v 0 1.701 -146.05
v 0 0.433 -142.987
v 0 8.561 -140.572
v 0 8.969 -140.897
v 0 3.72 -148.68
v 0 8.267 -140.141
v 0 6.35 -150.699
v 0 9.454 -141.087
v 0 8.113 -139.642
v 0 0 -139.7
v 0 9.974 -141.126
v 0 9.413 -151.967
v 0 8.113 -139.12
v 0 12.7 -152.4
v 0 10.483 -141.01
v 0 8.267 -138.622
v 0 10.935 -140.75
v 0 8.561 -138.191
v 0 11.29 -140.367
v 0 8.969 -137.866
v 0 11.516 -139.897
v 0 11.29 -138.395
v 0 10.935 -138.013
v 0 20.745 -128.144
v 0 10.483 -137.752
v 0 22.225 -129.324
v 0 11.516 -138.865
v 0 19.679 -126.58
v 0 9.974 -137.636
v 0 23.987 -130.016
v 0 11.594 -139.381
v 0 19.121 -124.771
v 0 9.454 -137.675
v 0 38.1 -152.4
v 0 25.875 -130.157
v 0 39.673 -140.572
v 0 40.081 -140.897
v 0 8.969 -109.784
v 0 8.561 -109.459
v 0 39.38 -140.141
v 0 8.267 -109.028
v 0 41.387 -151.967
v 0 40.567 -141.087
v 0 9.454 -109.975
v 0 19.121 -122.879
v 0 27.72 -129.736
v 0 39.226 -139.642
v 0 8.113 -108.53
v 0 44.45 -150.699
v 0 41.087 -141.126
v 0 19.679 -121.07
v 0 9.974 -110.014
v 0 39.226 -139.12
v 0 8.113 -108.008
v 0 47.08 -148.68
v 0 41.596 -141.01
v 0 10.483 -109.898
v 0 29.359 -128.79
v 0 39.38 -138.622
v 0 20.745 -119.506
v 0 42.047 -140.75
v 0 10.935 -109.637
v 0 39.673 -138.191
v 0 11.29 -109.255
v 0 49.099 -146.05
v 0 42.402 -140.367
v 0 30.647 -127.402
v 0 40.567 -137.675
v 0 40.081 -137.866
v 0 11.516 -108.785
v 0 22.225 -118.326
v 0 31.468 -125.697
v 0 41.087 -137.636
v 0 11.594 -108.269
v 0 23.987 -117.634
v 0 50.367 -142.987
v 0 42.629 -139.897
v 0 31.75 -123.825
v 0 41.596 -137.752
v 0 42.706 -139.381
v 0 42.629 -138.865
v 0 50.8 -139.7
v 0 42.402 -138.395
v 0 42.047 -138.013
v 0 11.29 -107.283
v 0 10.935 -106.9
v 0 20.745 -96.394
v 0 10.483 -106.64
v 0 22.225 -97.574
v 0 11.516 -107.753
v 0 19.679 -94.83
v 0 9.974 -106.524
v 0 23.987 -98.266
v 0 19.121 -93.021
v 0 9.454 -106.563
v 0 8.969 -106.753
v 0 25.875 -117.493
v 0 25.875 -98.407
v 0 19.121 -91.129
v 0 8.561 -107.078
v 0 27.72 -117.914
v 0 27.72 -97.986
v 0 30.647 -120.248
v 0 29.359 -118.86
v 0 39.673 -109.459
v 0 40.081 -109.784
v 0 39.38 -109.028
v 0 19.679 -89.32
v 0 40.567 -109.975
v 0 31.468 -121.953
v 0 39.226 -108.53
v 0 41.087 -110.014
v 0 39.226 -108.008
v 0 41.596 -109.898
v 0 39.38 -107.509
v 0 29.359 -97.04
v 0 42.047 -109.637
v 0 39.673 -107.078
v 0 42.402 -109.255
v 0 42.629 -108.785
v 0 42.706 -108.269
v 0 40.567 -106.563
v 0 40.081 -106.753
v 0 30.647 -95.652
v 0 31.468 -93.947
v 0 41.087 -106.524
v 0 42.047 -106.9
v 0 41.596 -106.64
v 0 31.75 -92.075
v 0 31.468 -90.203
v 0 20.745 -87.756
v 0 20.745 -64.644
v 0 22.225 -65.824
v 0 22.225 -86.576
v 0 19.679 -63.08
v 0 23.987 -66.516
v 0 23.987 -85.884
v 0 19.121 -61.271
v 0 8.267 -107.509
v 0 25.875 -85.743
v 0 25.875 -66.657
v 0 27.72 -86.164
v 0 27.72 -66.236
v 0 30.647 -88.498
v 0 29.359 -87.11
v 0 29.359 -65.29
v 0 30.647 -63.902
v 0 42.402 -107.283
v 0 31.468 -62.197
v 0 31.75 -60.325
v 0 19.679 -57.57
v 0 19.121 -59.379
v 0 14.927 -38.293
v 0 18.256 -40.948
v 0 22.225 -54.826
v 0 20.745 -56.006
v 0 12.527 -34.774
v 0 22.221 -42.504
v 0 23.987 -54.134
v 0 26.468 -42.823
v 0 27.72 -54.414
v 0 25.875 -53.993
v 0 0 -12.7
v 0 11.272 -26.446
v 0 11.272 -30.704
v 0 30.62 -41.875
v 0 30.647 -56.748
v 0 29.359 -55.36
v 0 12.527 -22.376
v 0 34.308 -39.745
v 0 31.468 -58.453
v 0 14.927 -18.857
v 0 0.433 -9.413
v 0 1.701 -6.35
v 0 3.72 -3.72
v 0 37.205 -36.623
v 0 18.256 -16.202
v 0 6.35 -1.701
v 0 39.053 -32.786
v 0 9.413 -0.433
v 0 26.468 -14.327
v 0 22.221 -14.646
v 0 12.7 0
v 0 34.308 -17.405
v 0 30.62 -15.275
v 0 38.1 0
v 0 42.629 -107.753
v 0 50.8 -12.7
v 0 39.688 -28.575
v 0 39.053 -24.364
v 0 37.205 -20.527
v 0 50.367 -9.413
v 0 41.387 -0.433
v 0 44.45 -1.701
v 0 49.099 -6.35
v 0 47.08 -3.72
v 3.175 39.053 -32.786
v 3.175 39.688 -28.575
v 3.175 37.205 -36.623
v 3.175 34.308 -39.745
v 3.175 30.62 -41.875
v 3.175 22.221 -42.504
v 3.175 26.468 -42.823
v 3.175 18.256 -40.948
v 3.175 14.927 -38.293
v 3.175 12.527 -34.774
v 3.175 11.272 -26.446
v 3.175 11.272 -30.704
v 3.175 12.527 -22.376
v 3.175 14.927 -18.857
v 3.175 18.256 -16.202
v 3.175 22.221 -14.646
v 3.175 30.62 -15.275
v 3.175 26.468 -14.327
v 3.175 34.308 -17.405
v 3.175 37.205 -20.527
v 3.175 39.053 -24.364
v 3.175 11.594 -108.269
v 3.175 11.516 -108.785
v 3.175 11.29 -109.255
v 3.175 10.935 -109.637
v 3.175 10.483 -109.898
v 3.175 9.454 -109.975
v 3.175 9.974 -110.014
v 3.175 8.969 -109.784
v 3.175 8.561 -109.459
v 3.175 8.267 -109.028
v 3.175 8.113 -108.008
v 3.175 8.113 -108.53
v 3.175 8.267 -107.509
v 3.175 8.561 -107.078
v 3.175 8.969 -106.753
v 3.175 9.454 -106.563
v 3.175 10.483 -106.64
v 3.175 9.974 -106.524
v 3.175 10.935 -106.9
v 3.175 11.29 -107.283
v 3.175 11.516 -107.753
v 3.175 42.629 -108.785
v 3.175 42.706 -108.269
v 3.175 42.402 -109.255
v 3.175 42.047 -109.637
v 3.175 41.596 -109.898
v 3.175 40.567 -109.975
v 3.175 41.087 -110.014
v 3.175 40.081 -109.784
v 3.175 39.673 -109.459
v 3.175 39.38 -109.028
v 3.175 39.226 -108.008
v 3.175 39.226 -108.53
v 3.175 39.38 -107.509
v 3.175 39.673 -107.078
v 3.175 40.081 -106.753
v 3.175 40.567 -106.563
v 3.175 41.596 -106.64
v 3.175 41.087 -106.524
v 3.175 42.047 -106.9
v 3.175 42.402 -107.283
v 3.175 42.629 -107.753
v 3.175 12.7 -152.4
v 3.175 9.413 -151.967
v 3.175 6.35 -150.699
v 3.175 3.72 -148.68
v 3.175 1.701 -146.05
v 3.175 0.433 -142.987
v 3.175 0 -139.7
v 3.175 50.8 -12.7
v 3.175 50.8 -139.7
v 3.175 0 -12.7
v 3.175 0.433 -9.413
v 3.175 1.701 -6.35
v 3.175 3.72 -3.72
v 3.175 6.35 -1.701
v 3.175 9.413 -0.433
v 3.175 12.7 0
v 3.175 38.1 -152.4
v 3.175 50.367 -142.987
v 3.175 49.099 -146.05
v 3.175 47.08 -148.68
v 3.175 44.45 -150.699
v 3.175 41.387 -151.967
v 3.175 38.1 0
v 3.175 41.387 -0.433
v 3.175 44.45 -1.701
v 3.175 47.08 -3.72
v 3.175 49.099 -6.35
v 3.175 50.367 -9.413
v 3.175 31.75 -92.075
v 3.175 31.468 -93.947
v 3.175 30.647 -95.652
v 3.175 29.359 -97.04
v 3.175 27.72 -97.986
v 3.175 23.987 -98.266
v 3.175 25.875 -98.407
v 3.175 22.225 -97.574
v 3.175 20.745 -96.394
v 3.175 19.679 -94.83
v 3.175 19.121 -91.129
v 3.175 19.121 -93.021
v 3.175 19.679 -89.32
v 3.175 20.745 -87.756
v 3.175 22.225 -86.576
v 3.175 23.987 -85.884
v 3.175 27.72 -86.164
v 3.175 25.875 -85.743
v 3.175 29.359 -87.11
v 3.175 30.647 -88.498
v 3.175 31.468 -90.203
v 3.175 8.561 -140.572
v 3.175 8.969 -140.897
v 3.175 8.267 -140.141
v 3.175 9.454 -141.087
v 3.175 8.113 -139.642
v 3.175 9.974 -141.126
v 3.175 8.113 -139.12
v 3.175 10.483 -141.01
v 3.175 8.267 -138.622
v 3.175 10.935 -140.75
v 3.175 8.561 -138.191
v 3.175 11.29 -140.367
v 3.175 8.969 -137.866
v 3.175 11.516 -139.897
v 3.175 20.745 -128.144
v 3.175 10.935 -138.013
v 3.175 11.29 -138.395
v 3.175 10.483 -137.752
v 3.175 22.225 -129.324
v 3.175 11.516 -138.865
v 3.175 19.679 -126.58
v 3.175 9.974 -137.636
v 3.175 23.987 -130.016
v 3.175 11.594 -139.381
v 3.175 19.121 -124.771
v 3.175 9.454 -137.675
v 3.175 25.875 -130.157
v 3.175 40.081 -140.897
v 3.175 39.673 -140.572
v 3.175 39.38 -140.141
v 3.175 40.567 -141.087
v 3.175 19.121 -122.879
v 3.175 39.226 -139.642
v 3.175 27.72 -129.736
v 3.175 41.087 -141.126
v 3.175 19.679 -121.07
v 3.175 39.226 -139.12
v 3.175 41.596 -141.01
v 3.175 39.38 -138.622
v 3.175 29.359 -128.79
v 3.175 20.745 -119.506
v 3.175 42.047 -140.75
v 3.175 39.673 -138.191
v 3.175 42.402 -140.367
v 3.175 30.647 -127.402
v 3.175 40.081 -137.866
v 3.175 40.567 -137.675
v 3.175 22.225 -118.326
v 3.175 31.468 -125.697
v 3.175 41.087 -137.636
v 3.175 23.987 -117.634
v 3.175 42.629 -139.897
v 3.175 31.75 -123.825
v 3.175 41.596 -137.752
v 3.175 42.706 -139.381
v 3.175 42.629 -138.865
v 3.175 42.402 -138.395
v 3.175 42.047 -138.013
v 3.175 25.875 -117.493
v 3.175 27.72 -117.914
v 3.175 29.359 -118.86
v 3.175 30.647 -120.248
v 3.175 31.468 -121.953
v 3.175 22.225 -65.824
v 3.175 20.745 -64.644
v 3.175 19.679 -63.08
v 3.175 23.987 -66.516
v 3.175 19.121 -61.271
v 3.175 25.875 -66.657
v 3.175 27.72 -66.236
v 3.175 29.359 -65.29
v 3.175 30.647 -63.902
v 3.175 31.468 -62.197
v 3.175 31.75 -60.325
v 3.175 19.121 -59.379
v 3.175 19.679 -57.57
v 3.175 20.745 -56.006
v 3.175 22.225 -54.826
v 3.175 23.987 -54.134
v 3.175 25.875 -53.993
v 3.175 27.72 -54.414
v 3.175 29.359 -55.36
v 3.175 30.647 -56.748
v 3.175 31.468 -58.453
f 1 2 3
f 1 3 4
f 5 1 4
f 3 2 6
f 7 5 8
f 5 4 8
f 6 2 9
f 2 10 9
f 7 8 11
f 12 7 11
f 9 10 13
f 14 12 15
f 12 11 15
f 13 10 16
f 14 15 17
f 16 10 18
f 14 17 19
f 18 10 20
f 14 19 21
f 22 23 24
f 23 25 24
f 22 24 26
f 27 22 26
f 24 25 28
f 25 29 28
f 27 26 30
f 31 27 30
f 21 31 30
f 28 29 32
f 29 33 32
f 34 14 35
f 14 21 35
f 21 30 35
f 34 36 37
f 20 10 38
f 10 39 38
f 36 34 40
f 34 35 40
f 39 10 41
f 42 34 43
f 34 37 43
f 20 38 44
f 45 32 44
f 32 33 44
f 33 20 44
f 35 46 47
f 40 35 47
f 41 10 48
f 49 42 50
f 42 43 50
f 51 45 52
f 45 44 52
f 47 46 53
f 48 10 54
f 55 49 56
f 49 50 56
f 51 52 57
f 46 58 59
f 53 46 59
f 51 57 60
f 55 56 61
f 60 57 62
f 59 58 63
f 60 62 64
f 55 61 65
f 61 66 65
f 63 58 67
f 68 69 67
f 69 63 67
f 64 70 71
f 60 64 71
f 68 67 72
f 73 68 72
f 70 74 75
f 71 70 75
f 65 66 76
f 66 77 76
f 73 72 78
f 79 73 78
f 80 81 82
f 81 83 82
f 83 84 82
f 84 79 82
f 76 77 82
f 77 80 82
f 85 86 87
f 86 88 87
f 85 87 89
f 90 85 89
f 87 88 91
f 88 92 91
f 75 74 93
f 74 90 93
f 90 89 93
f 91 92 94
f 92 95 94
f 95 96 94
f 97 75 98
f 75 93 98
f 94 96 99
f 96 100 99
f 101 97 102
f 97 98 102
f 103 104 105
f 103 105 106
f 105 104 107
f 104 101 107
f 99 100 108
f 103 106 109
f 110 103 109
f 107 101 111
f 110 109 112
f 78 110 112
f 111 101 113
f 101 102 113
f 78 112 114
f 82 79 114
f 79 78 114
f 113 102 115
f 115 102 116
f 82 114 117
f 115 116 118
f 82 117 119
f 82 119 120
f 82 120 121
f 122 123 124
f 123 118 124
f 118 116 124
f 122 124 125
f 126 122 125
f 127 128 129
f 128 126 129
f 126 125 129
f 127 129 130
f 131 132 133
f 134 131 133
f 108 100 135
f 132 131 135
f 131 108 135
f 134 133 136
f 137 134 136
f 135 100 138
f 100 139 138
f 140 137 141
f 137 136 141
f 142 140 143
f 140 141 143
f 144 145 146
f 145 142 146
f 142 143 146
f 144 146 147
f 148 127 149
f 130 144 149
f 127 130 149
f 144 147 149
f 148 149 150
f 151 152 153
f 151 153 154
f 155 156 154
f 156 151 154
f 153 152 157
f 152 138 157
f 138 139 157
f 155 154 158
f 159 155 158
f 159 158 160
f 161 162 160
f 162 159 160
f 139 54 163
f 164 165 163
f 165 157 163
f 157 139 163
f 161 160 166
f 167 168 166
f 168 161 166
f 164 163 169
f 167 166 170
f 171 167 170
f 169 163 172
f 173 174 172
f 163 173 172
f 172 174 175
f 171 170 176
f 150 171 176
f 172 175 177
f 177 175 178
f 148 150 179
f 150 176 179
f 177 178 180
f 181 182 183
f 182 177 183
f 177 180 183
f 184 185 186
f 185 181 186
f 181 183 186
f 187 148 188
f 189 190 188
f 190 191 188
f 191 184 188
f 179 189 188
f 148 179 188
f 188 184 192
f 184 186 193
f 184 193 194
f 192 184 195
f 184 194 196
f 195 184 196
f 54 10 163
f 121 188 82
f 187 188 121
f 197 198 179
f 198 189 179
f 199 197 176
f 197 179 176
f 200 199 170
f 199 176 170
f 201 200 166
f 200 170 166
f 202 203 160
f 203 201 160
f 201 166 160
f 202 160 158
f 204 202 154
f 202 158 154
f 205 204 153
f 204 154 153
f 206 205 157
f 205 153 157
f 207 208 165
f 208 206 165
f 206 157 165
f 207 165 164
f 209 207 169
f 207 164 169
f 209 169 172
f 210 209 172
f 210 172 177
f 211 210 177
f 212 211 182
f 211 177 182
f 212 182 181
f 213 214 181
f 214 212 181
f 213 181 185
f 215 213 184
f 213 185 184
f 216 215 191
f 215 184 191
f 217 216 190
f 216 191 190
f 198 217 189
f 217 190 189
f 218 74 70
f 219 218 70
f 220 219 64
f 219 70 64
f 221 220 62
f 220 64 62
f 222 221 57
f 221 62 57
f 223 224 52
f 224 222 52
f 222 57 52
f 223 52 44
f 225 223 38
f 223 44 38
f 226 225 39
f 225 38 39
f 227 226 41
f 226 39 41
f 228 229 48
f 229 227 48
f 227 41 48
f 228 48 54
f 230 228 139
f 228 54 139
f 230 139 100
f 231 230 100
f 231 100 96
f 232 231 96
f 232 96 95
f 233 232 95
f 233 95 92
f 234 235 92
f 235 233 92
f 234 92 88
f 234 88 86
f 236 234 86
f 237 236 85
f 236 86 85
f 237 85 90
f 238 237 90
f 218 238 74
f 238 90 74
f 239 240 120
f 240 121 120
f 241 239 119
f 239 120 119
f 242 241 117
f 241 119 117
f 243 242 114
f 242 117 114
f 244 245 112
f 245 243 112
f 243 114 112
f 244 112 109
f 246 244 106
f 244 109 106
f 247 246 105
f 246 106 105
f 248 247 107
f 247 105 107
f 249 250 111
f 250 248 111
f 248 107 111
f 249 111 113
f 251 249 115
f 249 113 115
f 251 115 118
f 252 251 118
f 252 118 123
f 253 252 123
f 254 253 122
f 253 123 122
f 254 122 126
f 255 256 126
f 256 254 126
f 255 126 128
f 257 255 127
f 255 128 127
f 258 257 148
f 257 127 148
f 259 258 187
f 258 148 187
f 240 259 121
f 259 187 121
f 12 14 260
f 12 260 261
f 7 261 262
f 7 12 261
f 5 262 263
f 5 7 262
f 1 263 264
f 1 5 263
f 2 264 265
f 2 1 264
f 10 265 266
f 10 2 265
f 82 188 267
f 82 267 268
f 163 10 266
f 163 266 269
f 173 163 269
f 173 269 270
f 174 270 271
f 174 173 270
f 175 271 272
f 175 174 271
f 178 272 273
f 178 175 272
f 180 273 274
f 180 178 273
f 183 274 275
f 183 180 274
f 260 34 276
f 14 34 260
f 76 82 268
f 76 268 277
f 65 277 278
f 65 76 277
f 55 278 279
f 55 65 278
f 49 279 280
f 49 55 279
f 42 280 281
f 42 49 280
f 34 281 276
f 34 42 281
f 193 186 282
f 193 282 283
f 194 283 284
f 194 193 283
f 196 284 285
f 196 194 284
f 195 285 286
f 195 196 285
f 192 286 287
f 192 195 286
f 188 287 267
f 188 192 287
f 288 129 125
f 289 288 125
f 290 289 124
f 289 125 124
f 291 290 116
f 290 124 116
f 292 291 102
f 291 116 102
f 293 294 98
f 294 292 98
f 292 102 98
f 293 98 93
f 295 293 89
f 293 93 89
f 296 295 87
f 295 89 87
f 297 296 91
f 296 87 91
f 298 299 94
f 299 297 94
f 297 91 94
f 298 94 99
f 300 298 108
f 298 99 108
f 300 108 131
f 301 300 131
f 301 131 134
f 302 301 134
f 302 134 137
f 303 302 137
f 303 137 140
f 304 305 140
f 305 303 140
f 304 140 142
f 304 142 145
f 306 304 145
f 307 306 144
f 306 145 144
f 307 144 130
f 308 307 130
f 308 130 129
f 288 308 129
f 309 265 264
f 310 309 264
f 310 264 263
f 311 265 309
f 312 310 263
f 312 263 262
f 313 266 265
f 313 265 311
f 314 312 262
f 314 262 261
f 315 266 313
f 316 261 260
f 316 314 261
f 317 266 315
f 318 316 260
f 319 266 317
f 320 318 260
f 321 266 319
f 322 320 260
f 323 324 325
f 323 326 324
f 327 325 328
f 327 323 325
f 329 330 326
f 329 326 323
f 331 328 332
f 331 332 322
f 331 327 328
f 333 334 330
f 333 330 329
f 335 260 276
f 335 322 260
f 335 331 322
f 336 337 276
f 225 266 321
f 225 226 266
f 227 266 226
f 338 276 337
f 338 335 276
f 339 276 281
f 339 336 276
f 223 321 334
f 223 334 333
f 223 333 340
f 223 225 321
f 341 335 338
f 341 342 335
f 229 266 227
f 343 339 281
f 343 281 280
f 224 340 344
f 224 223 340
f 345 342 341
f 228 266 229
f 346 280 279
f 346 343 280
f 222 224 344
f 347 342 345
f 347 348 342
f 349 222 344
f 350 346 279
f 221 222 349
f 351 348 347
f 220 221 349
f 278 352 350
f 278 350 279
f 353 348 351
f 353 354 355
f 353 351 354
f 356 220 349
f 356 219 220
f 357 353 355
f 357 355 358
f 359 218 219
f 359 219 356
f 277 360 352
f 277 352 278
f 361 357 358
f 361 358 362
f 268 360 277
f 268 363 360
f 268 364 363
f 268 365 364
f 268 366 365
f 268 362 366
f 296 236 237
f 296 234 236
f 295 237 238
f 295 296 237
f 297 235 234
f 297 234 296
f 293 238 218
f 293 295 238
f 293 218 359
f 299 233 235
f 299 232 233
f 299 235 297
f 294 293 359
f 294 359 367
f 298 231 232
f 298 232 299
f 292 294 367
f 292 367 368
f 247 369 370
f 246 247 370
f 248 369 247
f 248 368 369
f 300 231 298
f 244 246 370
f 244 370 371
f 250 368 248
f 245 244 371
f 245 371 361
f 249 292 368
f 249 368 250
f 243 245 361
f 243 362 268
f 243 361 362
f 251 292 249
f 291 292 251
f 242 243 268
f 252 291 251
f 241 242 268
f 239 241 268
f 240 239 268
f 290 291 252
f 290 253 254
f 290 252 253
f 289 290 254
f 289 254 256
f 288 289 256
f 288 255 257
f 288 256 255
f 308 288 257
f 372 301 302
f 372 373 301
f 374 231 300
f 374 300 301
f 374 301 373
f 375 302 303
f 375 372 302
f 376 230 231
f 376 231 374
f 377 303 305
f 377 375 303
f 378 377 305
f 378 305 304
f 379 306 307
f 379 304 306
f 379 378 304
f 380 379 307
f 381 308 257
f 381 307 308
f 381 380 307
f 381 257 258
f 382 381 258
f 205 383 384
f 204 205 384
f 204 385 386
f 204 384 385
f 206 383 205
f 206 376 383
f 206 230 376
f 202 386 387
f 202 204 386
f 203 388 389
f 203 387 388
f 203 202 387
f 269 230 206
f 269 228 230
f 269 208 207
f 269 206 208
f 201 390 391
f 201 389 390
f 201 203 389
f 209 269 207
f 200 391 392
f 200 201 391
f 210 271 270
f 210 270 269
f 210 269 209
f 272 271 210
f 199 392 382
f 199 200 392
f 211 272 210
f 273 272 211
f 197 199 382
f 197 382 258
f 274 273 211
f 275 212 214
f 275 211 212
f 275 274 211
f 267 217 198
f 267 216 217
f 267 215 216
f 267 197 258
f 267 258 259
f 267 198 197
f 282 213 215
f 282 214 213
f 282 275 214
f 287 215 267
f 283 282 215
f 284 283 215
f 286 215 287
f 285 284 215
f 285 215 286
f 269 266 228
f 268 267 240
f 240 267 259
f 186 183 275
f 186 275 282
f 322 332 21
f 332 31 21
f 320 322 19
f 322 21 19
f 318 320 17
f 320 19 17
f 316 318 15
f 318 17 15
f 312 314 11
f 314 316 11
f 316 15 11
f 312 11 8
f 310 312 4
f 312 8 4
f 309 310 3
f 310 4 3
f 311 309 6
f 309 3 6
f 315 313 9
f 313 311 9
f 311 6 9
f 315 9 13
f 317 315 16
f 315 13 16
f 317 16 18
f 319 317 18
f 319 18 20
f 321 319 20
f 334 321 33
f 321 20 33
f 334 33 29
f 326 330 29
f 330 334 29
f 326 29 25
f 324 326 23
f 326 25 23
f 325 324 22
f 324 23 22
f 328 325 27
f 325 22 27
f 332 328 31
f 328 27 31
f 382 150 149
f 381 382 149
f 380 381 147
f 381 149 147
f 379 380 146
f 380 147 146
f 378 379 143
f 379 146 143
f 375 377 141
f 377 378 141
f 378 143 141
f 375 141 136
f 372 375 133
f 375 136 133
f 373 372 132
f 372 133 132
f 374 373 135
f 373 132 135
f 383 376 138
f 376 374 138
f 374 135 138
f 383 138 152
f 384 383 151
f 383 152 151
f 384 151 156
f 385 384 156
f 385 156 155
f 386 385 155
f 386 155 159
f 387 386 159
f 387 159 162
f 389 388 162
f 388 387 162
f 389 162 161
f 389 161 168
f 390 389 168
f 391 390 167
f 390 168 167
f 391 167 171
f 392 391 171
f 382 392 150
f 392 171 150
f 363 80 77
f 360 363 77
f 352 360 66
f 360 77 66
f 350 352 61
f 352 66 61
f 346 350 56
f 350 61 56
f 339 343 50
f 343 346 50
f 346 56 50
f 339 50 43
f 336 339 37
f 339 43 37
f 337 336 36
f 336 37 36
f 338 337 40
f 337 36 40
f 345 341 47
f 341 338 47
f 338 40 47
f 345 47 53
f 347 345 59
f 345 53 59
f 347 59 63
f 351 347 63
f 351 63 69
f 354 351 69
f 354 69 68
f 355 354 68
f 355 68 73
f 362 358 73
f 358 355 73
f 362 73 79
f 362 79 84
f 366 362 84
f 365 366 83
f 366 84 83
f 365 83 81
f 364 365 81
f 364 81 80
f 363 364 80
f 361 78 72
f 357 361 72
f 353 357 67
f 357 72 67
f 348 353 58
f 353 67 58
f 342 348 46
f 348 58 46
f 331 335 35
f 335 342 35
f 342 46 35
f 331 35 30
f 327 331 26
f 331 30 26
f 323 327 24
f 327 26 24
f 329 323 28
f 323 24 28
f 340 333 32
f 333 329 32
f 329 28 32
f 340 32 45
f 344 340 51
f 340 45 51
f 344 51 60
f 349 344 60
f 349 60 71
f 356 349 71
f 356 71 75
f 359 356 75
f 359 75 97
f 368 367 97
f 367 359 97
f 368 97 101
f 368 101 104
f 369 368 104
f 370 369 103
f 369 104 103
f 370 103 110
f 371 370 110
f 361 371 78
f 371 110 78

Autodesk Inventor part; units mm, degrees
ref_plane "YZ Plane" through (0, 0, 0) normal (1, 0, 0) x (0, 1, 0)
ref_plane "XZ Plane" through (0, 0, 0) normal (0, 1, 0) x (-1, 0, 0)
ref_plane "XY Plane" through (0, 0, 0) normal (0, 0, 1) x (1, 0, 0)
sketch "Sketch1" plane through (0, 0, 0) normal (1, 0, 0) x (0, 1, 0)
  line L0 (12.7, 0) -> (38.1, 0)
  line L1 (50.8, -12.7) -> (50.8, -139.7)
  line L2 (38.1, -152.4) -> (12.7, -152.4)
  line L3 (0, -139.7) -> (0, -12.7)
  arc A0 (50.8, -12.7) -> (38.1, 0) centre (38.1, -12.7) ccw
  arc A1 (12.7, 0) -> (0, -12.7) centre (12.7, -12.7) ccw
  arc A2 (0, -139.7) -> (12.7, -152.4) centre (12.7, -139.7) ccw
  arc A3 (38.1, -152.4) -> (50.8, -139.7) centre (38.1, -139.7) ccw
  circle A4 centre (25.4, -28.575) radius 14.2875
  circle A5 centre (25.4, -60.325) radius 6.35
  circle A6 centre (25.4, -92.075) radius 6.35
  circle A7 centre (25.4, -123.825) radius 6.35
  circle A8 centre (25.4, -123.825) radius 22 construction
  circle A9 centre (40.9563, -139.3813) radius 1.75
  circle A10 centre (40.9563, -108.2687) radius 1.75
  circle A11 centre (9.8437, -108.2687) radius 1.75
  circle A12 centre (9.8437, -139.3813) radius 1.75
  line L4 (25.4, -28.575) -> (25.4, -123.825) construction
  point P0 (0, 0)
  point P1 (50.8, -152.4)
  point P2 (50.8, 0)
  point P3 (0, -152.4)
  point P4 (25.4, -152.4)
  point P5 (25.4, -76.2)
  point P6 (0, -76.2)
  dimension "d10" = 44
  dimension "d0" = 50.8
  dimension "d1" = 152.4
  dimension "d2" = 12.7
  dimension "d3" = 28.575
  dimension "d4" = 12.7
  dimension "d5" = 12.7
  dimension "d6" = 12.7
  dimension "d7" = 31.75
  dimension "d8" = 31.75
  dimension "d9" = 31.75
  dimension "d11" = 3.5
  dimension "d14" = 360
extrude "Extrusion1" add sketch "Sketch1" along normal blind 3.175
equation "\"d8\" = d7"
equation "\"d9\" = d7"
properties part number "Housing"
